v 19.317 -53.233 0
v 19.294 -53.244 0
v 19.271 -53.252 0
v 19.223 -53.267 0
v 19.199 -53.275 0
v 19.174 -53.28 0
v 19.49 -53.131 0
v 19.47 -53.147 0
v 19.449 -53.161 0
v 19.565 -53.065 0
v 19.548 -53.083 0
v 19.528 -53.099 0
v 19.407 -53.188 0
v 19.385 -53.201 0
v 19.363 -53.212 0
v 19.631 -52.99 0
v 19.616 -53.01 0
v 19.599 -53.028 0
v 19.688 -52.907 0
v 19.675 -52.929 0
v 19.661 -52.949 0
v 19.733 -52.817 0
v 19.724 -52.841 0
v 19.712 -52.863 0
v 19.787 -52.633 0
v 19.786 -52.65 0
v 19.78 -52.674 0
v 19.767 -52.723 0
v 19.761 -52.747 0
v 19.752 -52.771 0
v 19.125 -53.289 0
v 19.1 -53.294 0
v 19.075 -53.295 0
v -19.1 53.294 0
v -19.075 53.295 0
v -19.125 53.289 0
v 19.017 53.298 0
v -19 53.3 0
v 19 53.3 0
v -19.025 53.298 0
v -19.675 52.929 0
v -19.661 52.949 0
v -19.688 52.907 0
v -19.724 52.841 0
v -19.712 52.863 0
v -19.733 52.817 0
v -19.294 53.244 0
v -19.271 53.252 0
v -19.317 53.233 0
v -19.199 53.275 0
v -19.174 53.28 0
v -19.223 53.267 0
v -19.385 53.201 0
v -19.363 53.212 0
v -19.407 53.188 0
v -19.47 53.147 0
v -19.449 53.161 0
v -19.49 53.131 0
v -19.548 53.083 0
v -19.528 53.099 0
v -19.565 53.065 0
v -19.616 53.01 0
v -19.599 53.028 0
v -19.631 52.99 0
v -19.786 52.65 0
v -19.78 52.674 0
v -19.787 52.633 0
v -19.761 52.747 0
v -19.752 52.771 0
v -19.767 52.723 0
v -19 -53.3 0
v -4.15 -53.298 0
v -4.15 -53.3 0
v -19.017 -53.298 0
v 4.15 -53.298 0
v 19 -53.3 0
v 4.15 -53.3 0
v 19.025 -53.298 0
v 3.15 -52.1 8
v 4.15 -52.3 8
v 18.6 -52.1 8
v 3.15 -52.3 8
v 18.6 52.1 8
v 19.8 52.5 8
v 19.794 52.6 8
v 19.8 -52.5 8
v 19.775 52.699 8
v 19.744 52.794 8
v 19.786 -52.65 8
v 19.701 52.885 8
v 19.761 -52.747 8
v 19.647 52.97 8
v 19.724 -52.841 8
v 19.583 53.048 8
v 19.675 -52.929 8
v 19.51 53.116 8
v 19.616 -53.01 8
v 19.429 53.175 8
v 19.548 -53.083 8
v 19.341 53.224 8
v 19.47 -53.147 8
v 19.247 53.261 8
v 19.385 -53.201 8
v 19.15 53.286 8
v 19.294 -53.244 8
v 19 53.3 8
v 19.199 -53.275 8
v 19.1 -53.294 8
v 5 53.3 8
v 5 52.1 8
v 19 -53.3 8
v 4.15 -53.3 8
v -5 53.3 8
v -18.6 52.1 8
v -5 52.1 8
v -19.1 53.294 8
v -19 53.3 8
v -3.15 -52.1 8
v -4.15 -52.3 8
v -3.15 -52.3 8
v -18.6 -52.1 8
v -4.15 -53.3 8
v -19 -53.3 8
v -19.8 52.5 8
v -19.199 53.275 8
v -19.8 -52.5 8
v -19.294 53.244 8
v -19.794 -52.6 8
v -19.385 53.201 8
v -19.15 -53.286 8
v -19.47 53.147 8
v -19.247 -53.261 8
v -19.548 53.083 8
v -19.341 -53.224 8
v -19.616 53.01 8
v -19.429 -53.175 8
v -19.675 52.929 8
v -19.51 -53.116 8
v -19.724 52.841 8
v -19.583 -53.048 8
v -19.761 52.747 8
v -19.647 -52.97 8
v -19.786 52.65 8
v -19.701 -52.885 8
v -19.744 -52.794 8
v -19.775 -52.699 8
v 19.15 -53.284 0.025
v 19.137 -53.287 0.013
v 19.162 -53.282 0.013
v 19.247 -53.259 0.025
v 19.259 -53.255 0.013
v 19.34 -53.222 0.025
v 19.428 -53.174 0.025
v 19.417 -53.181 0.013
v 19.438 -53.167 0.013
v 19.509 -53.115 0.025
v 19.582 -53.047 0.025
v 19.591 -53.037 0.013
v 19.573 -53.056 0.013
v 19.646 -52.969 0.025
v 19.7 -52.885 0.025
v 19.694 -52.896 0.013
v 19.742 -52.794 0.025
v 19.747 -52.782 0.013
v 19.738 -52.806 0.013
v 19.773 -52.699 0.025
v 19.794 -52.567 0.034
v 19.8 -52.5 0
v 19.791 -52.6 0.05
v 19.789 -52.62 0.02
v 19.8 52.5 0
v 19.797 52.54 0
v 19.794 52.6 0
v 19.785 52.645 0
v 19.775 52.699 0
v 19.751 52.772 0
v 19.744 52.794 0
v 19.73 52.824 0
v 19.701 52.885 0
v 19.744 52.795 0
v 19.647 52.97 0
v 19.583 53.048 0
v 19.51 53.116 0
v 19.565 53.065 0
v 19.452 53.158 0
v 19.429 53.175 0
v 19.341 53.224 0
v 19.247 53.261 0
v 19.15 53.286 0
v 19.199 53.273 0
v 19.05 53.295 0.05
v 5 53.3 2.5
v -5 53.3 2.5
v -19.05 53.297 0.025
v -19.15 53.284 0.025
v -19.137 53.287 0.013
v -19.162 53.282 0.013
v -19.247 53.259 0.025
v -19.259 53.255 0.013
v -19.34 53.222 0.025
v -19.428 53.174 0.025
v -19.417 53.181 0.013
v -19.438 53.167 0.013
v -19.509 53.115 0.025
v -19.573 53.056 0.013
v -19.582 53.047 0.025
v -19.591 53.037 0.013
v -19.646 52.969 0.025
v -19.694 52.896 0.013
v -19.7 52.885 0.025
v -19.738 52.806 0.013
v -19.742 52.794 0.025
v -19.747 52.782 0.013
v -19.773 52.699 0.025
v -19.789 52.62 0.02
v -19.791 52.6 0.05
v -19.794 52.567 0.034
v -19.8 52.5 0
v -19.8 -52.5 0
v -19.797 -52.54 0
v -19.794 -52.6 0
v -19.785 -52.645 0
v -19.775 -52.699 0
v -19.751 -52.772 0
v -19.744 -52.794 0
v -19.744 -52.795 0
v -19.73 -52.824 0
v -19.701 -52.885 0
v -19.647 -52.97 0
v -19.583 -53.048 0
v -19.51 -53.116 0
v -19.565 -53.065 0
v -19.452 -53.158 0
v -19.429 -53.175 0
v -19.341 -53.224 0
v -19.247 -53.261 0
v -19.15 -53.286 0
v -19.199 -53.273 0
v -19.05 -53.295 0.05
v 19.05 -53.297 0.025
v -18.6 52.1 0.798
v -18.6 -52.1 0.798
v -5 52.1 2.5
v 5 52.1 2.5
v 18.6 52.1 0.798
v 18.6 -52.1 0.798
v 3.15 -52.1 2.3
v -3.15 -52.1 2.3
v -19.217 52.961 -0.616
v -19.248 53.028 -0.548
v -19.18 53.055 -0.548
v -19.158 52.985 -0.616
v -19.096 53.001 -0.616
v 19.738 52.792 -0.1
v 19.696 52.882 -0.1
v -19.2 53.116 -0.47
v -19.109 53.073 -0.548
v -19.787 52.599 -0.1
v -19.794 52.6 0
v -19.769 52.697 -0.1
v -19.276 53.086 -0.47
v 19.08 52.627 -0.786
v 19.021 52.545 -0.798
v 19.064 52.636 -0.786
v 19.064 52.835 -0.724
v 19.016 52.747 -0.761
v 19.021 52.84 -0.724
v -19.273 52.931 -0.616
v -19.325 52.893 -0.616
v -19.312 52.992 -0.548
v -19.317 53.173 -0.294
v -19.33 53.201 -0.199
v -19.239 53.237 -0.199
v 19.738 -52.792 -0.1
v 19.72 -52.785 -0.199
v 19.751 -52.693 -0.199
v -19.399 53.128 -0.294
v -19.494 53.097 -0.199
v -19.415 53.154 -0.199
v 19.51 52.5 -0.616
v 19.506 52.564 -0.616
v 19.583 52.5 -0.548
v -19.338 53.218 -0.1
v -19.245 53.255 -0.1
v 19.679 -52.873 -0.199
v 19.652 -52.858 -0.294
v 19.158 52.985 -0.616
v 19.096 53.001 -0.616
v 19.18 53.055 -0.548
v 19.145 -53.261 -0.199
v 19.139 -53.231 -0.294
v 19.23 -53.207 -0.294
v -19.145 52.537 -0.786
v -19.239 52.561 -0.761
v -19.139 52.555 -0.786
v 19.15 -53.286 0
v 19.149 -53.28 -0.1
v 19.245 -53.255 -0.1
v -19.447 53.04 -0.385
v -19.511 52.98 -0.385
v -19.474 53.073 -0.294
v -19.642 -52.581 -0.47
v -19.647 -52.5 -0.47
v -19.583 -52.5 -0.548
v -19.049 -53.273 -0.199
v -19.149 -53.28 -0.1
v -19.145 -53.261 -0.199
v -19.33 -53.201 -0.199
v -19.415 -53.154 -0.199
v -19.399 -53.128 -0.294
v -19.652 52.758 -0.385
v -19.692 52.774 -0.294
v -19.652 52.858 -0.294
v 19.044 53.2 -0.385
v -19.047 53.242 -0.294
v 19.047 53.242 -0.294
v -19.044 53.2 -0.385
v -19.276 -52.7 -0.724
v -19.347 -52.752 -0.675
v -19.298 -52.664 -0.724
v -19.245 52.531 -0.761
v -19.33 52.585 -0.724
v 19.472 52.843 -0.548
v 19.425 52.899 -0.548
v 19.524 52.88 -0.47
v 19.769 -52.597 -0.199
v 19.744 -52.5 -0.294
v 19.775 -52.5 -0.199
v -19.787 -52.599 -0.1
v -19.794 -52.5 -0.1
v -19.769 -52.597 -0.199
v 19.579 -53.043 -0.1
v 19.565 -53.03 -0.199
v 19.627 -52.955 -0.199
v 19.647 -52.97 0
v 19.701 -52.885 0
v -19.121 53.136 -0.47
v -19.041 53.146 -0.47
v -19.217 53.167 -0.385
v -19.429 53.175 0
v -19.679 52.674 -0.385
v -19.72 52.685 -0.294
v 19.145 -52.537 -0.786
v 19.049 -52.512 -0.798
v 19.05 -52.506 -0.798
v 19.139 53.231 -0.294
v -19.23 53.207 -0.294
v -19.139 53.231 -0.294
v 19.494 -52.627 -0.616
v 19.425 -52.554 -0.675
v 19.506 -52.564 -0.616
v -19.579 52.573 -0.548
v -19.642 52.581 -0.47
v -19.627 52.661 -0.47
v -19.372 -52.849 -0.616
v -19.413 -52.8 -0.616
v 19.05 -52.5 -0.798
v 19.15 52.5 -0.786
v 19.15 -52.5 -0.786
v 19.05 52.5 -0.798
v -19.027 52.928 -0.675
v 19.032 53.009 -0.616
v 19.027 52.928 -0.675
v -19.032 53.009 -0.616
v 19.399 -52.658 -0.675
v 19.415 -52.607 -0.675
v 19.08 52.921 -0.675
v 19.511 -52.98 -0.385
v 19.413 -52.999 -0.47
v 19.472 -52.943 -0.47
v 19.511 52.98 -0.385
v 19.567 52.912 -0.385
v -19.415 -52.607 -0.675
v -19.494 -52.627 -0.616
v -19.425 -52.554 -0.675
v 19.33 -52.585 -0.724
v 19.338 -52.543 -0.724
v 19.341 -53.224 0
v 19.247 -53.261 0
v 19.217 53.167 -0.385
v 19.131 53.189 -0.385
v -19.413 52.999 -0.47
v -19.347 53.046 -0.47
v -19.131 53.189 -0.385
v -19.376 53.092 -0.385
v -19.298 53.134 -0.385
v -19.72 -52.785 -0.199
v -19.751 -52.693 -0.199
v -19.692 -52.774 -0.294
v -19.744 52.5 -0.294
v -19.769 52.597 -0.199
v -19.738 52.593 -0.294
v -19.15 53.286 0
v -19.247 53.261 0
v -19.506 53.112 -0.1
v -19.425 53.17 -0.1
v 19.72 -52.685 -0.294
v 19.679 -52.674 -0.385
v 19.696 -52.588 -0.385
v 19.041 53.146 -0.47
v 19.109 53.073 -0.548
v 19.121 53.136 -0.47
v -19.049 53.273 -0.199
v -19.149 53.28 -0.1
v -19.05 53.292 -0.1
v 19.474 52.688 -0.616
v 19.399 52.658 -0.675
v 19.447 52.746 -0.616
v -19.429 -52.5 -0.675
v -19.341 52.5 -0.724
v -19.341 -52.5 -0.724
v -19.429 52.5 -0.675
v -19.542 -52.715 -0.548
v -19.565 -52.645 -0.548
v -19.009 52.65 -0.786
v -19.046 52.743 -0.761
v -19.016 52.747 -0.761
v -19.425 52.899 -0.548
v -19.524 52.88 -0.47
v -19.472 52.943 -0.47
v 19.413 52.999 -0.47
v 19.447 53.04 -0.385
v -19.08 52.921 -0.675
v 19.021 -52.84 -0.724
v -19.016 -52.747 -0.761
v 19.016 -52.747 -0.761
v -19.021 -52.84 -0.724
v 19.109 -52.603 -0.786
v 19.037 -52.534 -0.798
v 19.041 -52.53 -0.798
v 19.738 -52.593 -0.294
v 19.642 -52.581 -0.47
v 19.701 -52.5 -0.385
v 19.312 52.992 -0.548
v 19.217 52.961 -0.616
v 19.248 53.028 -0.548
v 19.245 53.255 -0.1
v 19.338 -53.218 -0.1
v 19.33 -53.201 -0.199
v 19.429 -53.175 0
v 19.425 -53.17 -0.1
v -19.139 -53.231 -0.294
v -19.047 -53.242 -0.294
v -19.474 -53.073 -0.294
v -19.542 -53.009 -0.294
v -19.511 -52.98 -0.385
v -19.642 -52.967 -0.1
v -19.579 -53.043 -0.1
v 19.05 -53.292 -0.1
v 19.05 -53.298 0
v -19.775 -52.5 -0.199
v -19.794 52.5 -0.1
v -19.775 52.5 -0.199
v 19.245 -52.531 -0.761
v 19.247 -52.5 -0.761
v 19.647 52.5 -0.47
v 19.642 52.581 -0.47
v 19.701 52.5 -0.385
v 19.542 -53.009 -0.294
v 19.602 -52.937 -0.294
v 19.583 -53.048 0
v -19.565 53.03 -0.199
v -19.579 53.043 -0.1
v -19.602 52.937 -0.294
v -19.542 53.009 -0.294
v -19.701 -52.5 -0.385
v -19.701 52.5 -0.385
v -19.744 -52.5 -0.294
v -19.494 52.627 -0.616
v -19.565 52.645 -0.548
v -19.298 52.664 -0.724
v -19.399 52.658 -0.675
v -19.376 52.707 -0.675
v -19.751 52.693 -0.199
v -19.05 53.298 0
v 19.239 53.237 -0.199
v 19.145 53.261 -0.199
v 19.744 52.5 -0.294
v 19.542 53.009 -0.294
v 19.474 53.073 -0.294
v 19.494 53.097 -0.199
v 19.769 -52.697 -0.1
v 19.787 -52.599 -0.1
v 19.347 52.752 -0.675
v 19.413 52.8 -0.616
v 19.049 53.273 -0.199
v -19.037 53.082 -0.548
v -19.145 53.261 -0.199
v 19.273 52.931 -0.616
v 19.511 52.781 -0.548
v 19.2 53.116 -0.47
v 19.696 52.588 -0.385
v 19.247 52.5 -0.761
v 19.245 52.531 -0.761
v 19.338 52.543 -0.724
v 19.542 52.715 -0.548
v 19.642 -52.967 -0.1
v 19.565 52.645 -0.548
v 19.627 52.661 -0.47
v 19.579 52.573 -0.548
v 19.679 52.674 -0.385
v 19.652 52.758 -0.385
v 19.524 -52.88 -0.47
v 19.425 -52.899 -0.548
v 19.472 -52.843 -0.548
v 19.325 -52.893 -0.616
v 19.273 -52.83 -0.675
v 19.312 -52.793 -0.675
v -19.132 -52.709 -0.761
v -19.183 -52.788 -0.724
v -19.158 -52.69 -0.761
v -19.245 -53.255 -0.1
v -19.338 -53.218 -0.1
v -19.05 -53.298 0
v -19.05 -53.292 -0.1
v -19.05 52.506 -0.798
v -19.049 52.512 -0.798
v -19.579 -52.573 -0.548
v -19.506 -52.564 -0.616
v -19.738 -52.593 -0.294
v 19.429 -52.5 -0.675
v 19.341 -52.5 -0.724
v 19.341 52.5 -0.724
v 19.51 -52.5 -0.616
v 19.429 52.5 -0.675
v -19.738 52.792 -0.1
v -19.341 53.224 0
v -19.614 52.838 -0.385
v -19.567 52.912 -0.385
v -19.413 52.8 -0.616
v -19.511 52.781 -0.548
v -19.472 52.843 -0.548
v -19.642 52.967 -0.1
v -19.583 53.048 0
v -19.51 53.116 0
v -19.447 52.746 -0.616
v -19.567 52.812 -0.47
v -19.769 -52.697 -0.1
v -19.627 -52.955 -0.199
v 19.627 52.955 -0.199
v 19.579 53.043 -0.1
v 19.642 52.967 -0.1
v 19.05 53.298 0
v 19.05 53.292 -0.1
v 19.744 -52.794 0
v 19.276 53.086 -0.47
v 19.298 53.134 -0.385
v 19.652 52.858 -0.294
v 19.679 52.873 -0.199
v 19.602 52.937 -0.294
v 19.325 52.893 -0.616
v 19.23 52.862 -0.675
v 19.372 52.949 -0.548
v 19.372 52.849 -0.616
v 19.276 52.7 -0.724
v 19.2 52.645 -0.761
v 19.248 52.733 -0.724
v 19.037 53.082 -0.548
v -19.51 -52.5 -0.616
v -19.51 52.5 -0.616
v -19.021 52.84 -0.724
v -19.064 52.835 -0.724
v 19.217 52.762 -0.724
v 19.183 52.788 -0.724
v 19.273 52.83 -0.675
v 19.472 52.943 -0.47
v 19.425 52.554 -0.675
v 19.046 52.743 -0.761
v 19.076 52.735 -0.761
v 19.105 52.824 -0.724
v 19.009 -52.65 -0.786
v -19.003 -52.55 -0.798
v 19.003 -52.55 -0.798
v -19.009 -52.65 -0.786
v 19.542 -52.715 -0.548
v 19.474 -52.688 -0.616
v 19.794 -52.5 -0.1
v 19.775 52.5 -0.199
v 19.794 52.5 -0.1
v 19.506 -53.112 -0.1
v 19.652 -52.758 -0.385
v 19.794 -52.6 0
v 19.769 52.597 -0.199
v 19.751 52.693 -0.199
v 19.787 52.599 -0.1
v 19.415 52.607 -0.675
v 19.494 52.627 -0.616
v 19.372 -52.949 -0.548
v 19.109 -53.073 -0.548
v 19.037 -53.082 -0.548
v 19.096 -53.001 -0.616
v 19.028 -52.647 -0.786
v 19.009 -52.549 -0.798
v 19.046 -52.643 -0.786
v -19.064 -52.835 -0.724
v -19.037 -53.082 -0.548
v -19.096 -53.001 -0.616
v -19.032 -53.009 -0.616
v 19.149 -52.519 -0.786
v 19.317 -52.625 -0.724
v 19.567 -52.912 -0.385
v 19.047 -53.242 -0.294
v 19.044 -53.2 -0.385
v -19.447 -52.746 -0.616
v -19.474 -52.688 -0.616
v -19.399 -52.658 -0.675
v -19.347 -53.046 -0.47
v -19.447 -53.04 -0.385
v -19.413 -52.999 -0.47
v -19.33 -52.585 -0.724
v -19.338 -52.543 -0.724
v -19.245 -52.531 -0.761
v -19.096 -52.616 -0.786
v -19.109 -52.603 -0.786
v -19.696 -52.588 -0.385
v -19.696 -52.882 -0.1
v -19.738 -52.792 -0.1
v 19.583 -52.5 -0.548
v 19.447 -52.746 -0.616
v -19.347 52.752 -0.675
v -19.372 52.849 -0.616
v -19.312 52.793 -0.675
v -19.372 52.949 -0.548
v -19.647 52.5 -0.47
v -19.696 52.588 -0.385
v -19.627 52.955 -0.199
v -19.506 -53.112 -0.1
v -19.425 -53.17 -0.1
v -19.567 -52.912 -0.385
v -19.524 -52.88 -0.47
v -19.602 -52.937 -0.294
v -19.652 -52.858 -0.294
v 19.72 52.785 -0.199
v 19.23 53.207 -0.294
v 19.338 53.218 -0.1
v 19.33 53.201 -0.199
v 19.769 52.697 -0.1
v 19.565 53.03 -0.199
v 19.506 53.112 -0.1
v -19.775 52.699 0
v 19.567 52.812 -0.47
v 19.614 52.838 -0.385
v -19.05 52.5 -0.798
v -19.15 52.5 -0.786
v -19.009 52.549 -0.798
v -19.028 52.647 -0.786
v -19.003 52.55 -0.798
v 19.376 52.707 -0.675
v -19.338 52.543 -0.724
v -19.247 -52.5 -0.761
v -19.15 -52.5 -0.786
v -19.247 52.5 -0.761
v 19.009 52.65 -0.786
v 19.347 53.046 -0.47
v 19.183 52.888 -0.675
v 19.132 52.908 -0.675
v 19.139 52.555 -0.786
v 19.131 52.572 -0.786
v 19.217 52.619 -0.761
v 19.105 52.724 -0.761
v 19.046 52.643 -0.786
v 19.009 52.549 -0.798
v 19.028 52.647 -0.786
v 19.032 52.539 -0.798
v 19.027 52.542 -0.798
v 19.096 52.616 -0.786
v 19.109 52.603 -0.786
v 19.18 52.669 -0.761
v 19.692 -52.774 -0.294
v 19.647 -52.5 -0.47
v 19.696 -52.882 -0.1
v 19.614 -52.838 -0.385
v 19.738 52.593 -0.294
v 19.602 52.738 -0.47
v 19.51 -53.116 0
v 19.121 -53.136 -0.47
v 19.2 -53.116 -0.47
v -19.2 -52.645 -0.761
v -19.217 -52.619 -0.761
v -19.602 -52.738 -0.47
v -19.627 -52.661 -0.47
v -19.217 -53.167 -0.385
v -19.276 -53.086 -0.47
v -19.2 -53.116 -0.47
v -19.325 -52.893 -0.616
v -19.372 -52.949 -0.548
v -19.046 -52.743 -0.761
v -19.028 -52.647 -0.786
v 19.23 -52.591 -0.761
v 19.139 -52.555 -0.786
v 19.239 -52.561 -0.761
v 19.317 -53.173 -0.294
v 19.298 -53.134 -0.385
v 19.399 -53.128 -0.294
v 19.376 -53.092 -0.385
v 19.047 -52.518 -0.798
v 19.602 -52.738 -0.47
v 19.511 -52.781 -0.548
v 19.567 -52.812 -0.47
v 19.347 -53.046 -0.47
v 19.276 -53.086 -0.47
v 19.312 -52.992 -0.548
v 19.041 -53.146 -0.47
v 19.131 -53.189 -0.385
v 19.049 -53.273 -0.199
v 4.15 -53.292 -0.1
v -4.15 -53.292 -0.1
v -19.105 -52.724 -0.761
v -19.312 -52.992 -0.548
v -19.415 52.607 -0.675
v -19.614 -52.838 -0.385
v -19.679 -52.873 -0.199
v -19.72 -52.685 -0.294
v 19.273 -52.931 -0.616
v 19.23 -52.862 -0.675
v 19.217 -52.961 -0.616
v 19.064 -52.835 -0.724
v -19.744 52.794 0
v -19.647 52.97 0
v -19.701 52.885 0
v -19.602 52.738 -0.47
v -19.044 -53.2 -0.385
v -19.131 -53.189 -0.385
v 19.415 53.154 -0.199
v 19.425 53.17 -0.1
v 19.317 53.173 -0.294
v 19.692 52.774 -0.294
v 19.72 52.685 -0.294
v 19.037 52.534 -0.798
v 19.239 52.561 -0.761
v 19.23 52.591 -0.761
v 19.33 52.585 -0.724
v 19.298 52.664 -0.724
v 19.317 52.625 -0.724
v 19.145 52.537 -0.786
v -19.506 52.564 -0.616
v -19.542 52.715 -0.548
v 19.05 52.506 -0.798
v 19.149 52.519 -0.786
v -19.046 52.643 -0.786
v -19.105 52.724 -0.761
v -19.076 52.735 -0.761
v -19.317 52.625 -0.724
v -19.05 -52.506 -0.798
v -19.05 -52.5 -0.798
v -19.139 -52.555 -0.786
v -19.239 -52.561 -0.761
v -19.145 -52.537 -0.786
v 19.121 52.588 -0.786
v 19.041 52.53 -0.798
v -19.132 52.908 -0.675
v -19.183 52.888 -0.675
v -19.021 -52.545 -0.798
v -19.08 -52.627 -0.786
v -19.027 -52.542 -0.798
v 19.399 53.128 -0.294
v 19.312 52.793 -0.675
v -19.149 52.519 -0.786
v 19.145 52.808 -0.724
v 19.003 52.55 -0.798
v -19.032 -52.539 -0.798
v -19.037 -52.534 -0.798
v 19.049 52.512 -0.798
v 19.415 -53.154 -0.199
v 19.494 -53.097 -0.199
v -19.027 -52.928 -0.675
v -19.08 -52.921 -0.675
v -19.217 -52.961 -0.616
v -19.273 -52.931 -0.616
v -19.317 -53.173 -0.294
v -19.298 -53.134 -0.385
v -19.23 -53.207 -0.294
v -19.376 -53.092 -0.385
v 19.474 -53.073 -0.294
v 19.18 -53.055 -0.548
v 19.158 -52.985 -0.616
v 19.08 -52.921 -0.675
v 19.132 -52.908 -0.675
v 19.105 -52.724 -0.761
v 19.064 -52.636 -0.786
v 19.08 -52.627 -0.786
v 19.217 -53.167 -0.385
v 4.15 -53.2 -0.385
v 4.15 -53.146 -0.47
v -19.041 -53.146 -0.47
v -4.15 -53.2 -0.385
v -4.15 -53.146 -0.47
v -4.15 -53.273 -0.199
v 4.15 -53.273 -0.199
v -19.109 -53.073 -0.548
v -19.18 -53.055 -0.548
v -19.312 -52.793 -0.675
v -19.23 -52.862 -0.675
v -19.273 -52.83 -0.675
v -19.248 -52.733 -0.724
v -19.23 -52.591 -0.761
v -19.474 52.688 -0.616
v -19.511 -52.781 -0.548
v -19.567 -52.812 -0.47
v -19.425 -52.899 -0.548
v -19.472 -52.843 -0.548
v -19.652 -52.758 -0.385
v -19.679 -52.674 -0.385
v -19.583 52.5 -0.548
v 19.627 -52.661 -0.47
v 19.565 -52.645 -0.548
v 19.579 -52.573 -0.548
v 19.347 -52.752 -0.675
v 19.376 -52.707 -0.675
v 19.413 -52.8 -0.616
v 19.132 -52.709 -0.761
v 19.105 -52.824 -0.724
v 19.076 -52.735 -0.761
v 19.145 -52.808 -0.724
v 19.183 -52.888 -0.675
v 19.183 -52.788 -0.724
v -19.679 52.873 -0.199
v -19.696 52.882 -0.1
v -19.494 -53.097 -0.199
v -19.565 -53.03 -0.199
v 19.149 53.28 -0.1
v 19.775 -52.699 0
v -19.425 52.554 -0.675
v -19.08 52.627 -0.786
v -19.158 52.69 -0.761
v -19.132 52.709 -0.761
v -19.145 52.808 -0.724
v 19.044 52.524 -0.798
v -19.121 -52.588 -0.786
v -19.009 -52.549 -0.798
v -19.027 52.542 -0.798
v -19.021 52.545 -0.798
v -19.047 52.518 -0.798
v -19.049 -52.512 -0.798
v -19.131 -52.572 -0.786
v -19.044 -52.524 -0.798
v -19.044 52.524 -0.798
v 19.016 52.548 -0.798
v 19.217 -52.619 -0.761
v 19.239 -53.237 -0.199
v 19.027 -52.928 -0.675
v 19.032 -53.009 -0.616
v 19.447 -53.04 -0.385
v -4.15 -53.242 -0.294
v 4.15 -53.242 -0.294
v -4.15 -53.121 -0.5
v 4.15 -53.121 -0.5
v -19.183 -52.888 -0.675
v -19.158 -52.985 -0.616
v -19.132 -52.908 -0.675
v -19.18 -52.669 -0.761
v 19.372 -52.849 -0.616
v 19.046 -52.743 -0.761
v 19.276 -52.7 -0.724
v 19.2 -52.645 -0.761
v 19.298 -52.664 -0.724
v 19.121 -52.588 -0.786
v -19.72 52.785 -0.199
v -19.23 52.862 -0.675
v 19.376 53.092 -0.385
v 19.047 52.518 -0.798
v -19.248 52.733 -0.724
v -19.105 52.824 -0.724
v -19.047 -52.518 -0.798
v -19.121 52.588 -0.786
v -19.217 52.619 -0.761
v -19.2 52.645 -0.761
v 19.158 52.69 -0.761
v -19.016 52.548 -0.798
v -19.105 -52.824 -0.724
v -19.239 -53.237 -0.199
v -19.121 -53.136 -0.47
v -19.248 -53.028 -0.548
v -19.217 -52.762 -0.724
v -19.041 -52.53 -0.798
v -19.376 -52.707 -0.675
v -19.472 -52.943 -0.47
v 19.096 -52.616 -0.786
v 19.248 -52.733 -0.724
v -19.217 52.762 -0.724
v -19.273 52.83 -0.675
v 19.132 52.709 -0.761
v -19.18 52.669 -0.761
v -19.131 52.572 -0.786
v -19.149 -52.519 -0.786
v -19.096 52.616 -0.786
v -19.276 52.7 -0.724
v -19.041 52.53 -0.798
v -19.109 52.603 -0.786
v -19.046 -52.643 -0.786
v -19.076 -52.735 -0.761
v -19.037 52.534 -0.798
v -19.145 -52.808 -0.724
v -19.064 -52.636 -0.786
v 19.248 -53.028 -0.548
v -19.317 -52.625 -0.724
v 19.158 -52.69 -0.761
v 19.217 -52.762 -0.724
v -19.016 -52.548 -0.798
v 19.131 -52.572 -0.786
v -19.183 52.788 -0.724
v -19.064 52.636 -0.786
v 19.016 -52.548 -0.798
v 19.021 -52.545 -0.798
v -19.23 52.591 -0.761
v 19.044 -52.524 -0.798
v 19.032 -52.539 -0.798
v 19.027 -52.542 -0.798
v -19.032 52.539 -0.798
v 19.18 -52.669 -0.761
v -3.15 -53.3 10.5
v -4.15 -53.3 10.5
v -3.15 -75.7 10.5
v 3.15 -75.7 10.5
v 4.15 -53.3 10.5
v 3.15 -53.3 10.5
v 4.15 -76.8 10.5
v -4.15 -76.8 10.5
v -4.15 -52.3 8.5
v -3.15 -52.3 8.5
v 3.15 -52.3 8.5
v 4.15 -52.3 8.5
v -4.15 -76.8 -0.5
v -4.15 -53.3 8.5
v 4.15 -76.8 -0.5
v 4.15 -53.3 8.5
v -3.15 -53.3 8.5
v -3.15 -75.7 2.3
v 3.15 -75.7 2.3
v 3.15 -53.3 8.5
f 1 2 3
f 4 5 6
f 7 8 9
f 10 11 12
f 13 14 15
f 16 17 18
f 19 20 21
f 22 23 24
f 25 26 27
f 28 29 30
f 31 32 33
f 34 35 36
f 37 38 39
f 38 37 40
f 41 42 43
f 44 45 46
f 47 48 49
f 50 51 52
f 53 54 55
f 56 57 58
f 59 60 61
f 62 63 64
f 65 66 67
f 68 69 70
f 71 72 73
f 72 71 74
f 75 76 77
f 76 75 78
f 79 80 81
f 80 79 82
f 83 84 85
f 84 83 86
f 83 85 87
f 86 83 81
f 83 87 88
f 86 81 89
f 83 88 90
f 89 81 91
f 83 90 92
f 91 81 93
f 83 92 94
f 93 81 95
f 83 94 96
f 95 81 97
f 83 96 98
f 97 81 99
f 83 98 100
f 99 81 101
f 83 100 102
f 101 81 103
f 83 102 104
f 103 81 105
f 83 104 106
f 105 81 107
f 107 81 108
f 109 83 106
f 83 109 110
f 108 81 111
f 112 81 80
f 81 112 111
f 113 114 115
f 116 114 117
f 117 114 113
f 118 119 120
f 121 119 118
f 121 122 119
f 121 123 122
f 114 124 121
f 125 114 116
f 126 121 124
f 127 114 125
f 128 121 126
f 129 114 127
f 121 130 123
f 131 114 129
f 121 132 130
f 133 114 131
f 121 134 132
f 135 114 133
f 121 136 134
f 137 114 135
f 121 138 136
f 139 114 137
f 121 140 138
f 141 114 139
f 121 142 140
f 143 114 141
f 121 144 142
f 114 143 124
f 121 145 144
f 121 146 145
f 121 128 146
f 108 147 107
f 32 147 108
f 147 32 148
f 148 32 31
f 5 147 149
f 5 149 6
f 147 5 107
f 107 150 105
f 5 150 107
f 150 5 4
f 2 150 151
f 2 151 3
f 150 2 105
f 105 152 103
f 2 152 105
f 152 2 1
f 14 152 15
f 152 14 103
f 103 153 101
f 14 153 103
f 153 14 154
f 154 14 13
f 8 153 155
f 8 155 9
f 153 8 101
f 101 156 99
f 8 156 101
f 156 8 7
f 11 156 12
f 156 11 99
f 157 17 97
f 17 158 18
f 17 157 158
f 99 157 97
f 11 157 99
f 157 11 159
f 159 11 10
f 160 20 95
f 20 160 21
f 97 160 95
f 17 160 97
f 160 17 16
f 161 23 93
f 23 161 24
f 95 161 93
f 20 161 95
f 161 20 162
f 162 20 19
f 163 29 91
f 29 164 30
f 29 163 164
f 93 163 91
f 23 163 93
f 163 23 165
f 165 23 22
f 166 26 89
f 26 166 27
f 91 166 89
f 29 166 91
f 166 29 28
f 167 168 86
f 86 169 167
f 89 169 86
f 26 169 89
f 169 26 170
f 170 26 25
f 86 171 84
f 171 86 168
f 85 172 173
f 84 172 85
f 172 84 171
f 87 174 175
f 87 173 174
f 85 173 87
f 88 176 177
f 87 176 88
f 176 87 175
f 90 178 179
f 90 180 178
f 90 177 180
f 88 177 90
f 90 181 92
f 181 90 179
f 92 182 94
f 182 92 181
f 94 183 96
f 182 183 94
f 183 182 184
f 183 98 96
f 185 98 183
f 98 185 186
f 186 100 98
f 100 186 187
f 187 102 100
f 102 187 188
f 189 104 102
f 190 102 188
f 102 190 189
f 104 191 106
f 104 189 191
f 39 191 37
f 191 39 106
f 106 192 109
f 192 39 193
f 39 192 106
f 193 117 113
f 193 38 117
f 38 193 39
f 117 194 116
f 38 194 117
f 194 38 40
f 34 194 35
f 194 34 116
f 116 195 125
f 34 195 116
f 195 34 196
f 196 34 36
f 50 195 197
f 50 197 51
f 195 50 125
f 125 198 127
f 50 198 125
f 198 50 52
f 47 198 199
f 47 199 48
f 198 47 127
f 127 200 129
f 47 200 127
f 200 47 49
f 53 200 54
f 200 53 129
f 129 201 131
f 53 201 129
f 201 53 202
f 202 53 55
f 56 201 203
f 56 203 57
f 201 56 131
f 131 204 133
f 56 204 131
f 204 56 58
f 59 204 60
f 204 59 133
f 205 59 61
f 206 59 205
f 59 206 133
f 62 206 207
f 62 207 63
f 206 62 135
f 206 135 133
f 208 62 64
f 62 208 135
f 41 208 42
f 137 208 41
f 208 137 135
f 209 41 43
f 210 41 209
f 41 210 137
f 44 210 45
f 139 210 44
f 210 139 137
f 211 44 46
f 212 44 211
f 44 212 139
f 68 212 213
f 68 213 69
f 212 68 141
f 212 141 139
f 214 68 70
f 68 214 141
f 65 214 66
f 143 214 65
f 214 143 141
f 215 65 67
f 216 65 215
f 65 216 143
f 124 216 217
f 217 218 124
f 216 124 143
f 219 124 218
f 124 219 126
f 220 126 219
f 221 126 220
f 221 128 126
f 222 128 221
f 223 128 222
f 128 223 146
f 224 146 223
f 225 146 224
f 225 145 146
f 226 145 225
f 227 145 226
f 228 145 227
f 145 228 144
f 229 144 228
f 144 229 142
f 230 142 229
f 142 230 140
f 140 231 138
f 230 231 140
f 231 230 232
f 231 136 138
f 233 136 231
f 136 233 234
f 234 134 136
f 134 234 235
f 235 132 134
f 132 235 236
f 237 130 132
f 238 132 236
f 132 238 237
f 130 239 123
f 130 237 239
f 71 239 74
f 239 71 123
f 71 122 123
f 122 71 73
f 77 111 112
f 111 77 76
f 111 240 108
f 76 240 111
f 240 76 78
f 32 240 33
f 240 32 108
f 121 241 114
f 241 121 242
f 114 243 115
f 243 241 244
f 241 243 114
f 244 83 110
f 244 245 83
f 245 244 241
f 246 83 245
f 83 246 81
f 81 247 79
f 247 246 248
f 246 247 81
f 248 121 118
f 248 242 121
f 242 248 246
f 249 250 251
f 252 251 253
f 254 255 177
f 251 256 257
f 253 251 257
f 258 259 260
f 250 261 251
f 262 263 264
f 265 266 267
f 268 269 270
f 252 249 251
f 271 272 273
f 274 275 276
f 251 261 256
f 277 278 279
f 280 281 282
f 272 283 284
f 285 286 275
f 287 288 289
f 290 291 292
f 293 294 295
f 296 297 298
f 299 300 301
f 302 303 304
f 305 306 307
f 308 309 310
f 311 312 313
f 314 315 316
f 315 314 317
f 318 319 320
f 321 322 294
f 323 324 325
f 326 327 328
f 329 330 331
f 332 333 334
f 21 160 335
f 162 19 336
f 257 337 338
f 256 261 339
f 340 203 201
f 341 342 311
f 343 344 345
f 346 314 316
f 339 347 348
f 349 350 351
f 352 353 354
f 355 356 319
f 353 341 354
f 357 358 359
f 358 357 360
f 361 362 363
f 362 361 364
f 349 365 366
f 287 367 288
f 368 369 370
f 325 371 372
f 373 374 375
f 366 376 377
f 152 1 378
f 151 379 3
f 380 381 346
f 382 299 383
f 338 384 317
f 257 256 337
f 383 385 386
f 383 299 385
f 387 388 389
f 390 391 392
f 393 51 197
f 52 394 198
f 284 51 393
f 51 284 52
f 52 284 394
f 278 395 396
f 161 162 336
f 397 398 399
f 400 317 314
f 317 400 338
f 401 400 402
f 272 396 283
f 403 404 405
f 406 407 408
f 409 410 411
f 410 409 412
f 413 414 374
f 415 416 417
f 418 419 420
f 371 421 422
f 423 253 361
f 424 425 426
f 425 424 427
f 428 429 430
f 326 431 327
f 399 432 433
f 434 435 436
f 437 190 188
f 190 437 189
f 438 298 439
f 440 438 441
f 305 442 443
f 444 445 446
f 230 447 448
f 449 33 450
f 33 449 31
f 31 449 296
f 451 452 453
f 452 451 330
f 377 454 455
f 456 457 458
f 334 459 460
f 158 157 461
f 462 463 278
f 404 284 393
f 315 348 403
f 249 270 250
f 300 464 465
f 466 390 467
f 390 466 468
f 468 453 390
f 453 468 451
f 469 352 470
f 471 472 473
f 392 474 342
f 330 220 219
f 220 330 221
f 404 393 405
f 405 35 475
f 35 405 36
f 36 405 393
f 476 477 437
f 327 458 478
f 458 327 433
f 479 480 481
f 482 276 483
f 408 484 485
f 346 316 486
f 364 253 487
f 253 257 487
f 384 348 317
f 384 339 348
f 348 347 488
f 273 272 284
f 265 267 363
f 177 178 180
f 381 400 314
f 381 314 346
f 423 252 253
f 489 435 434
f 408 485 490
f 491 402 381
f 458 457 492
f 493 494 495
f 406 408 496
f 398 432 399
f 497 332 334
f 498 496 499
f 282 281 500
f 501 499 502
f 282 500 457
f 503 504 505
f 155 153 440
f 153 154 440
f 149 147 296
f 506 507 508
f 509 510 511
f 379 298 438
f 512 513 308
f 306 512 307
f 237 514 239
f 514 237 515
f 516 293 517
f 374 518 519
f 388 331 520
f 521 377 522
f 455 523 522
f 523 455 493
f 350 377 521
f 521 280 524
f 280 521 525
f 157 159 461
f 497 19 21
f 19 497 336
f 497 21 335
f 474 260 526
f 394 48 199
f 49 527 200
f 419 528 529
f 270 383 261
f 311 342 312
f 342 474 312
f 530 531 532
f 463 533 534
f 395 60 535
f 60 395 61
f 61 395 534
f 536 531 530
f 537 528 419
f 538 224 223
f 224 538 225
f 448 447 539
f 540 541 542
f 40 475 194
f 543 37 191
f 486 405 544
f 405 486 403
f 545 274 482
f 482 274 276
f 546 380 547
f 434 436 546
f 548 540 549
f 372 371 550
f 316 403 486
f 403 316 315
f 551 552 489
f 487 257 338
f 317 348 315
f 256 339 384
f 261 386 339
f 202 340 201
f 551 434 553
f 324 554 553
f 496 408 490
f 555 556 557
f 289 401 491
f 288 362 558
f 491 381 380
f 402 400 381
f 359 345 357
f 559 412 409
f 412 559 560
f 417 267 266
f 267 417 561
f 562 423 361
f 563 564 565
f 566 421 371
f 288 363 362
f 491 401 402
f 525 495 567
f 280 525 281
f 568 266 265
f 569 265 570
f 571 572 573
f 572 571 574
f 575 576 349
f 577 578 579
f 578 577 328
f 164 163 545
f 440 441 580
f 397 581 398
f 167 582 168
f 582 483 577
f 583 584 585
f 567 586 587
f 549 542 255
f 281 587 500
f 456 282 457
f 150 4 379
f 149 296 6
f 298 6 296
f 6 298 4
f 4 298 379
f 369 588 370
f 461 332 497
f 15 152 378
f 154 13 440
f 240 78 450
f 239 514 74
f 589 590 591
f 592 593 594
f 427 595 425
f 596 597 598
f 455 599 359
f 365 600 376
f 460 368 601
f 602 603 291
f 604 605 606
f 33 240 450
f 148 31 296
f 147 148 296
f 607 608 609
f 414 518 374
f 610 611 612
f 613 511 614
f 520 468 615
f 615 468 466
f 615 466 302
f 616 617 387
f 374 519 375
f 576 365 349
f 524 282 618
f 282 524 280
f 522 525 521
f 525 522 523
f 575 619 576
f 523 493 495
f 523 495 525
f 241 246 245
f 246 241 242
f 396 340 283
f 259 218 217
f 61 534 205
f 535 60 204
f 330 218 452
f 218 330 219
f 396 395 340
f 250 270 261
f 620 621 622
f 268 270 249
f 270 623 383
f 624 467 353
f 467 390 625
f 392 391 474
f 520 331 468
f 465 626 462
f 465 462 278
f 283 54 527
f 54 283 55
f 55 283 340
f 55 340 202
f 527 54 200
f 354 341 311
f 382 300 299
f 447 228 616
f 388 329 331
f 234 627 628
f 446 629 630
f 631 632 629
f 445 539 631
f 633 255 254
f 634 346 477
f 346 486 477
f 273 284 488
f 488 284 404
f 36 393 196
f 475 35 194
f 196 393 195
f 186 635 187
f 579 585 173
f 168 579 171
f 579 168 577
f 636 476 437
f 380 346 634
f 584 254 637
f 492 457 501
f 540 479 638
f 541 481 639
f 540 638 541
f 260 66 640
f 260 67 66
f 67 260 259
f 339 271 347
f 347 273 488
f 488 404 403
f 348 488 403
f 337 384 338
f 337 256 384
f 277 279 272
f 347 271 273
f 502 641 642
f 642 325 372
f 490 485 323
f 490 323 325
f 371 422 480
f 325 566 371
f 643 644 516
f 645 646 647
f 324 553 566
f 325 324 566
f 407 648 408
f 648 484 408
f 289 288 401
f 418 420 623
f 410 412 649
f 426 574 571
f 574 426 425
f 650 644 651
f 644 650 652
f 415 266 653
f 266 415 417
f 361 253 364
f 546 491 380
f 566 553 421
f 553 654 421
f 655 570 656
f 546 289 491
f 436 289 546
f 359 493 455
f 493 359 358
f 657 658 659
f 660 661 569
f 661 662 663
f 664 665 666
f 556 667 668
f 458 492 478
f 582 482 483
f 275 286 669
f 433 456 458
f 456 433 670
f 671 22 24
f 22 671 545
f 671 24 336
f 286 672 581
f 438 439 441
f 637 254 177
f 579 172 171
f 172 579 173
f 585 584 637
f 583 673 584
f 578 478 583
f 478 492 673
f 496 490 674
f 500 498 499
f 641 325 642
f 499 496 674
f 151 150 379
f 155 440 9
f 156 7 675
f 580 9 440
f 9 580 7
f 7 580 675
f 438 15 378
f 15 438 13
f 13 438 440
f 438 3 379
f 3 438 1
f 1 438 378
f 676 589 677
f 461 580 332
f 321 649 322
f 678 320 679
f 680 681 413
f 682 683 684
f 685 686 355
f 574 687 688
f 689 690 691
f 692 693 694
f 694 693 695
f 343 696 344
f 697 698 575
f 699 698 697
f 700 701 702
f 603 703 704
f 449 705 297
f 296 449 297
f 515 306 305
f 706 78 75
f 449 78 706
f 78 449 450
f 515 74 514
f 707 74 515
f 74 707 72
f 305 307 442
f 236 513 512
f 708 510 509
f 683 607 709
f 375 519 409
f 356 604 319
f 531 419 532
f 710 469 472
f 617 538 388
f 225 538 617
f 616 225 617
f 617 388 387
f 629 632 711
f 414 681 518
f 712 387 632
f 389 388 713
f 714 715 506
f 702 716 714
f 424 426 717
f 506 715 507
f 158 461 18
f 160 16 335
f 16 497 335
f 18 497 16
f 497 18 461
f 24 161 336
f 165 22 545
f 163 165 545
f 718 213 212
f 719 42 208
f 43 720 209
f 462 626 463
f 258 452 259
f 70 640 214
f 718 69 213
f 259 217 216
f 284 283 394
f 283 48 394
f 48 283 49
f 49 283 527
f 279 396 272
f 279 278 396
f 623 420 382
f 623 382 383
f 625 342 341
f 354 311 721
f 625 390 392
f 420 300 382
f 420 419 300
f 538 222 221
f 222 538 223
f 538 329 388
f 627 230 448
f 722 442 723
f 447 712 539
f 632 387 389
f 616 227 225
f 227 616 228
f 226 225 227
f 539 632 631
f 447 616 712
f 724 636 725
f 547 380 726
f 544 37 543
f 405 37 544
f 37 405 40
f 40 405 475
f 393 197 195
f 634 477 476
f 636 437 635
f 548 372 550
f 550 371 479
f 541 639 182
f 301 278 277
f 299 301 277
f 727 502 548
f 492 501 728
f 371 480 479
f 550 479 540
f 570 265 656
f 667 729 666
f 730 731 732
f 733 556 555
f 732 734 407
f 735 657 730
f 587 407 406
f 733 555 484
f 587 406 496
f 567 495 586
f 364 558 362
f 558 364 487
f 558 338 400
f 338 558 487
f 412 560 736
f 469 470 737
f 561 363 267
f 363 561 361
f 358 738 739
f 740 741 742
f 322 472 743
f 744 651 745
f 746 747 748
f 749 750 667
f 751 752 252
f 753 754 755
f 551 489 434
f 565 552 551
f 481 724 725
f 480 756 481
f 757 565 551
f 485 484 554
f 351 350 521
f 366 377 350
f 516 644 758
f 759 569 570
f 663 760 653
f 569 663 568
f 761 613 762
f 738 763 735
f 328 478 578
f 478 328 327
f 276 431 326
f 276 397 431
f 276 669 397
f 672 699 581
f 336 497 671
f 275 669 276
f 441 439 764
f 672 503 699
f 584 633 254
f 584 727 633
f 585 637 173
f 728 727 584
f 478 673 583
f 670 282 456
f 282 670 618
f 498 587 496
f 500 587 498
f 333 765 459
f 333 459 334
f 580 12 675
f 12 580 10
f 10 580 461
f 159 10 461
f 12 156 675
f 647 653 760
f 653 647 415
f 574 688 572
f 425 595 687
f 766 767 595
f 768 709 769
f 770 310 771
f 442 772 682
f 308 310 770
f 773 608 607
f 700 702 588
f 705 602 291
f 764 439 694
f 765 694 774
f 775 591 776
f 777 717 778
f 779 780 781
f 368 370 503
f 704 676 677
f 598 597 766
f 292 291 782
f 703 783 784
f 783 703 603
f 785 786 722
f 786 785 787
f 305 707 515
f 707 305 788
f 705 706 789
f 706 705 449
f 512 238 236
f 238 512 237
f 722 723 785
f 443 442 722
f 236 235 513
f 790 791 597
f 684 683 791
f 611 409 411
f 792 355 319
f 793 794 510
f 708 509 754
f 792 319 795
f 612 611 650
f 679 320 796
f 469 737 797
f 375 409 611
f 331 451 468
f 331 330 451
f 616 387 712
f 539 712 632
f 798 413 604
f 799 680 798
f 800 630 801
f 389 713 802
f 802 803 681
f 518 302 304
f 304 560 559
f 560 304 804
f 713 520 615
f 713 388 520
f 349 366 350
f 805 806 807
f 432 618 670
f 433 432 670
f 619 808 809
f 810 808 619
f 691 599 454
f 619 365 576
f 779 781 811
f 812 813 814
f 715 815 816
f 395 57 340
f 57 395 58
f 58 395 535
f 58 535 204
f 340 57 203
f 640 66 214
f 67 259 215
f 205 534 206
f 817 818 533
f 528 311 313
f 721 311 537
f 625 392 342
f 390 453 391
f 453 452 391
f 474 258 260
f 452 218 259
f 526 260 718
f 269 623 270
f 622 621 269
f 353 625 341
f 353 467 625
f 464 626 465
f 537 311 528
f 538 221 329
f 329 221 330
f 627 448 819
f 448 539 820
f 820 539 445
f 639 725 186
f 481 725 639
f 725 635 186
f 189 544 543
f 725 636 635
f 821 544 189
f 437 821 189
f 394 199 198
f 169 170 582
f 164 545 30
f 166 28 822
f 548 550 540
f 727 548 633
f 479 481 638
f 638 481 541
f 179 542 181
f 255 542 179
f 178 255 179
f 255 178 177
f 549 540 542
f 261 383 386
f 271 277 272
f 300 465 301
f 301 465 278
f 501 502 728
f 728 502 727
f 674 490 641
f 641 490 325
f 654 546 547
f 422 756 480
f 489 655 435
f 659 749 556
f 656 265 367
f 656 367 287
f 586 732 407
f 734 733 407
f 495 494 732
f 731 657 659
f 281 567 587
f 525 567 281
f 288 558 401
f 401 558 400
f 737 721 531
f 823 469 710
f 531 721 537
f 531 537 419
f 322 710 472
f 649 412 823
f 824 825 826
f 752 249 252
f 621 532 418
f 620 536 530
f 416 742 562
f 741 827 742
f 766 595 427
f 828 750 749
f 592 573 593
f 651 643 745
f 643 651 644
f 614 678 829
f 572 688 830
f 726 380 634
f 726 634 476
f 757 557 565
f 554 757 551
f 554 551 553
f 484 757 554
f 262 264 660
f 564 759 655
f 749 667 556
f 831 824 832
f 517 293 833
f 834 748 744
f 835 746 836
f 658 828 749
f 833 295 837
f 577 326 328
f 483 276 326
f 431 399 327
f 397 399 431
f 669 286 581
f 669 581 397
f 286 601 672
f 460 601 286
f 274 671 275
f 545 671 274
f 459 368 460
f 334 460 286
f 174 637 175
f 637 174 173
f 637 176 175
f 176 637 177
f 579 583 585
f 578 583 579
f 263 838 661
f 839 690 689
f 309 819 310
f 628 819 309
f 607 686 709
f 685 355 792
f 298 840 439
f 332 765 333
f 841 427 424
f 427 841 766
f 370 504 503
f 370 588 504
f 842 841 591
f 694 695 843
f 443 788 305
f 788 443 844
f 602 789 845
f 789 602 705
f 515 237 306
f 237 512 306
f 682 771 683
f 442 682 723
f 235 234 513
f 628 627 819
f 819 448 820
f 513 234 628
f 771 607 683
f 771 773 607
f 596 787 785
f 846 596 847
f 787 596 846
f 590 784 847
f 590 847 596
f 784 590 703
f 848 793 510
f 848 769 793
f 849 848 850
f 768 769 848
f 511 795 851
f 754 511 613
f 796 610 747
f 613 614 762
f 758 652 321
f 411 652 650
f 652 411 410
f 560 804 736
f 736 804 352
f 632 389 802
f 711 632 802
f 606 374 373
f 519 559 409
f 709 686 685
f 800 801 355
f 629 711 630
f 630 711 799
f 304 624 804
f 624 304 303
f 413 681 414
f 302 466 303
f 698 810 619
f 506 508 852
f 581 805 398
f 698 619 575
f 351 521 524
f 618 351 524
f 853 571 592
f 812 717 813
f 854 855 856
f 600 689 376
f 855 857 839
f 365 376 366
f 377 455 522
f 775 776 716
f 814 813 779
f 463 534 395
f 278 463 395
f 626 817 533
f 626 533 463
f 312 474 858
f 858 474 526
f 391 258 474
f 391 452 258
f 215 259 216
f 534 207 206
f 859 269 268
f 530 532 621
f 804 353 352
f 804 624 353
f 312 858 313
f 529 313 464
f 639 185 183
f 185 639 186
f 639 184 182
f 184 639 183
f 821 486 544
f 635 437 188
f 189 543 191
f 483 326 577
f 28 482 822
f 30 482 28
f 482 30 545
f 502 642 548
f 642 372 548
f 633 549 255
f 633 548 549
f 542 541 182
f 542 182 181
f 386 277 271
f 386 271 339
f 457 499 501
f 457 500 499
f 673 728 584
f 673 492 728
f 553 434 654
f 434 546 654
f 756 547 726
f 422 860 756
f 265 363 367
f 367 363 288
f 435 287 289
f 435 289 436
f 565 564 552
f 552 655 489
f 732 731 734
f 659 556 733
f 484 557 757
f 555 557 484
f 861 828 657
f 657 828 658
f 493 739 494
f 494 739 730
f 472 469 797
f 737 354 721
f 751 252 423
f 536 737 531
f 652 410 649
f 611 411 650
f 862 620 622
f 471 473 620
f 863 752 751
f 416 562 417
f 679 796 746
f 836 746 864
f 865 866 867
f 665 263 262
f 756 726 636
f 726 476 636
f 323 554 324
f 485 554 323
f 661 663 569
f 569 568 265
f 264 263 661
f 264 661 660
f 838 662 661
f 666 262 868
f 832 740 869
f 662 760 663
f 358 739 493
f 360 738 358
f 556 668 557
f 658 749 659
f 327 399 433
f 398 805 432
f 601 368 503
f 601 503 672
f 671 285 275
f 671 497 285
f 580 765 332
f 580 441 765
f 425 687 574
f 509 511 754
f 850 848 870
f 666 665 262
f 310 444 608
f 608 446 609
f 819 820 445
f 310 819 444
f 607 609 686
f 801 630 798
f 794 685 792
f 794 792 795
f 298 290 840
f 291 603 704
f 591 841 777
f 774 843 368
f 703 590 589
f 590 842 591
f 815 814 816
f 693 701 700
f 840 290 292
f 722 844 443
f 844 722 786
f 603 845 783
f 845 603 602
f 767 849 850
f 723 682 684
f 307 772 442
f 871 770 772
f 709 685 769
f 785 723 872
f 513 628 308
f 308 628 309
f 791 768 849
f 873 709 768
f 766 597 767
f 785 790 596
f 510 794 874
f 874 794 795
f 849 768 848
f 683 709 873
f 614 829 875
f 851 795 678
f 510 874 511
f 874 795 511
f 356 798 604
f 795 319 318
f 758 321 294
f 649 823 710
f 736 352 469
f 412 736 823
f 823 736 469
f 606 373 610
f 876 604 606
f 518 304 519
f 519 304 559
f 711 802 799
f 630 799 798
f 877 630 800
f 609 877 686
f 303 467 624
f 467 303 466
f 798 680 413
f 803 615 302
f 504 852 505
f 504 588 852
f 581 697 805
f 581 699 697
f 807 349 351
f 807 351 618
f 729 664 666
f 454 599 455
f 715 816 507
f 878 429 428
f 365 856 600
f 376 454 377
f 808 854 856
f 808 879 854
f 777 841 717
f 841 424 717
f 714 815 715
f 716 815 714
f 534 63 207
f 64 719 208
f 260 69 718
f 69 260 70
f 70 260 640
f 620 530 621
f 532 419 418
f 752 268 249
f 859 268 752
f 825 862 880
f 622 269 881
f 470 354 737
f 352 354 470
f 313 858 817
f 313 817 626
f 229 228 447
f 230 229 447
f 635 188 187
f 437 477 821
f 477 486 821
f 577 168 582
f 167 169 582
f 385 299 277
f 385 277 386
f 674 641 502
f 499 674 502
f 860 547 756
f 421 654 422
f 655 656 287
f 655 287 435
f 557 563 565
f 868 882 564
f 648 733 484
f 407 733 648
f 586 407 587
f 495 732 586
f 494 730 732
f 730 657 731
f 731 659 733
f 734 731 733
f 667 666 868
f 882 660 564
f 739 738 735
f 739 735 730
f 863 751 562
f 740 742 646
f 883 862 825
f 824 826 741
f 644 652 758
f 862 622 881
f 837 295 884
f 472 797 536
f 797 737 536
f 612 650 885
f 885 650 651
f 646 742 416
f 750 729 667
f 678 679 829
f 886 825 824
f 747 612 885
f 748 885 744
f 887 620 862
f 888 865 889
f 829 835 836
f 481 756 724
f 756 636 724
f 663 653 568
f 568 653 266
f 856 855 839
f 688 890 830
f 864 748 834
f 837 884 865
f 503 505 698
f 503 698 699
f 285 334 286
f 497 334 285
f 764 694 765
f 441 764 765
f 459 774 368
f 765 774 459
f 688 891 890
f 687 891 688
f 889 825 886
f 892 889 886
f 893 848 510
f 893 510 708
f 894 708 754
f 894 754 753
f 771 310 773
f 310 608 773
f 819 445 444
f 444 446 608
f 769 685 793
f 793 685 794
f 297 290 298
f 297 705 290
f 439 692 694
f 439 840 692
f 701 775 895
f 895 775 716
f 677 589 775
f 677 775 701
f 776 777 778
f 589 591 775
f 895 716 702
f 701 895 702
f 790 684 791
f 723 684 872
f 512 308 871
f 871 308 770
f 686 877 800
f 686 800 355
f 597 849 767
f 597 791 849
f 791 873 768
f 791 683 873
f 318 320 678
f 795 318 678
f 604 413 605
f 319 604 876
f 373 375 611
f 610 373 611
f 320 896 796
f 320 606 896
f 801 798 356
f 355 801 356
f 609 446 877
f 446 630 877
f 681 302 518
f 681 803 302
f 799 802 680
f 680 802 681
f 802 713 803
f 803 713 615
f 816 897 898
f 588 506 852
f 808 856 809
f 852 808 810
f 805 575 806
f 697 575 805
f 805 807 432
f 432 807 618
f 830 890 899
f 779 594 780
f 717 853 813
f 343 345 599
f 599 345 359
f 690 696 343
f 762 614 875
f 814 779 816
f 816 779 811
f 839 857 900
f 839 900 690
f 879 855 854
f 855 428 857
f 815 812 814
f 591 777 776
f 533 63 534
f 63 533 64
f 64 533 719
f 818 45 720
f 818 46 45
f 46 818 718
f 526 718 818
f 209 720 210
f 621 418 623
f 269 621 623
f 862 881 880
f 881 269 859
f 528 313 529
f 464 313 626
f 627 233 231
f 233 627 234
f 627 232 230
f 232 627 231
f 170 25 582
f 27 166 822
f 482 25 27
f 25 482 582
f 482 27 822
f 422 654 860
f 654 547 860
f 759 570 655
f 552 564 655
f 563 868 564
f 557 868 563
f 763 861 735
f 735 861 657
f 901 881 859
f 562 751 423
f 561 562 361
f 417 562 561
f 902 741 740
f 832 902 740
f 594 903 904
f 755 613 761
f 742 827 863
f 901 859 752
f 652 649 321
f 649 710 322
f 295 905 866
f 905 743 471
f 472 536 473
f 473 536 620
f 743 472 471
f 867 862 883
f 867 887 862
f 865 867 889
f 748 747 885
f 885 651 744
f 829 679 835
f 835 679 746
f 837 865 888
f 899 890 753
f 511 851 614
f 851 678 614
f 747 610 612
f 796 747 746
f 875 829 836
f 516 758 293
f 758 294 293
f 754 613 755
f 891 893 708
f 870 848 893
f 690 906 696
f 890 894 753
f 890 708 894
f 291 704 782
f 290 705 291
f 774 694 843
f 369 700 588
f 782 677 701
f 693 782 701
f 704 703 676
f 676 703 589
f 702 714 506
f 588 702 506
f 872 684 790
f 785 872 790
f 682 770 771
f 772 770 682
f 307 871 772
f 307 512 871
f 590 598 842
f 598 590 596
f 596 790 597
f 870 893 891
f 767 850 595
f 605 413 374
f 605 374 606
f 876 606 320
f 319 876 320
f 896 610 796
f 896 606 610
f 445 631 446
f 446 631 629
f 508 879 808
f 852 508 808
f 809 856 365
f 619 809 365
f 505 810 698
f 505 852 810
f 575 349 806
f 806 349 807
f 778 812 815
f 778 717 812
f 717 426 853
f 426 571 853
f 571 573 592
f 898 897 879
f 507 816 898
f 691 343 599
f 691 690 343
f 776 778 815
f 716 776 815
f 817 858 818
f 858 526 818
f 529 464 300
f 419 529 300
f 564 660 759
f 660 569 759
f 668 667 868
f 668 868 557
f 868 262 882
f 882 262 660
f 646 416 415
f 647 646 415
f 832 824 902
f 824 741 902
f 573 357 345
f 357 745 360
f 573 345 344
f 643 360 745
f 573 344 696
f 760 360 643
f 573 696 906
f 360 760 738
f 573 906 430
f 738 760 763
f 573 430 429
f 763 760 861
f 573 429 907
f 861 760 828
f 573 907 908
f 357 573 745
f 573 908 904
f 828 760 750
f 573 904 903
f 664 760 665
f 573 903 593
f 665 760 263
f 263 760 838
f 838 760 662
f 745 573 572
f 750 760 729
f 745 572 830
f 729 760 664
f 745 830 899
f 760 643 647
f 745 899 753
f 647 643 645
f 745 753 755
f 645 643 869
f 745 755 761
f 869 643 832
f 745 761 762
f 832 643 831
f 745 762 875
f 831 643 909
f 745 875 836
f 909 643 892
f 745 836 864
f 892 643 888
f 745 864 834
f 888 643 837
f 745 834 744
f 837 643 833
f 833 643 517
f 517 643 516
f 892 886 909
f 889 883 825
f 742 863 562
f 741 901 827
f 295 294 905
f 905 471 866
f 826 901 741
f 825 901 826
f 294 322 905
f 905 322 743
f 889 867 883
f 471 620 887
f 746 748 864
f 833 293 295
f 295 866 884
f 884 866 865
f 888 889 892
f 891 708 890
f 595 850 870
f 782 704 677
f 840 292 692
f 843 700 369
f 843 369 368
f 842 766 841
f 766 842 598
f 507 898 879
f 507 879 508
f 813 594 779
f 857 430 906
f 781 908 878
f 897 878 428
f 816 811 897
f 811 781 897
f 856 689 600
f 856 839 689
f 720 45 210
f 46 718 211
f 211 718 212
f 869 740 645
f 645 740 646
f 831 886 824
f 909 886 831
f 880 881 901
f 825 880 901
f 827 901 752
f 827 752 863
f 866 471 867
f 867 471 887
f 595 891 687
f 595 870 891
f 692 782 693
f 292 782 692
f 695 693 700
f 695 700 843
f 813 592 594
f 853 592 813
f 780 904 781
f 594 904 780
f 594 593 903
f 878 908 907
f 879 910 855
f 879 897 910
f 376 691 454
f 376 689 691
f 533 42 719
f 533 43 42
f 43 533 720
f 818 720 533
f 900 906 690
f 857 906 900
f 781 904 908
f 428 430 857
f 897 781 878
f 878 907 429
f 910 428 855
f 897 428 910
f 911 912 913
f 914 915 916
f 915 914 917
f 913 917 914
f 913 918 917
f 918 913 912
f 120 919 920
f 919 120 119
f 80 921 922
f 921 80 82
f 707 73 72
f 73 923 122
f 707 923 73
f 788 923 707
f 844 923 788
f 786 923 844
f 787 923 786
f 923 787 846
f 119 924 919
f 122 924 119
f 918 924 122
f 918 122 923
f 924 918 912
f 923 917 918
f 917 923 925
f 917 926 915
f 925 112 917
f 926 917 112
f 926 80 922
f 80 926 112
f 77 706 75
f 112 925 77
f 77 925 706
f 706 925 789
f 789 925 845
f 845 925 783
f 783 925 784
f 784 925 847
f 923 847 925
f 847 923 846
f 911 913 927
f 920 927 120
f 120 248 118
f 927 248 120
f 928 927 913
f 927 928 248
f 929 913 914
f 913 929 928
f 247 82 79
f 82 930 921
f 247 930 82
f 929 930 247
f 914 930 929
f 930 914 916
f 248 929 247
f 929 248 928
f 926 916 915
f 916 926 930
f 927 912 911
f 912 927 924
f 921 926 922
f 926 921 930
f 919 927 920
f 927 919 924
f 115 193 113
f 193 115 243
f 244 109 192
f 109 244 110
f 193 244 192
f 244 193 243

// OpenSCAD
$fn=50;

BOX_W = 38; // Box Width
BOX_L = 105;// Box Length
BOX_H = 8.0; // Box Height

CORNER_RADIUS = 0.8; // Radius of corners
WALL = 0.8;// Wall Thickness all sides

MIC_OUTSIDE_WIDTH=8.3;
MIC_OUTSIDE_HEIGHT=11.0;
MIC_INSIDE_WIDTH=6.3;
MIC_LENGTH=24.5;

CON_OUTSIDE=5;
CON_INSIDE=4;
CON_LENGTH=3;

MIC_OFFSET_X = 0;
MIC_OFFSET_Y = -34.3;
MIC_OFFSET_Z = 0;

VENT_OFFSET = -4.5;
VENT_L = 19.0;
VENT_R = -19.0;

module sq_vent(x, y, vent_offset) {
    translate([x, y, BOX_H + vent_offset]) {
        rotate([90, 0, 90]) {
            linear_extrude(2.5) square([2, 2], center=true);
        }
    }
}

module vent(x, y, vent_offset) {
    translate([x, y, BOX_H + vent_offset]) {
        rotate([90, 0, 90]) {
            cylinder(h=3.0, d=2.0, center=true);
        }
    }
}

difference() {
    union() {
        linear_extrude( BOX_H )
        difference(){
            offset(r=CORNER_RADIUS) square( [BOX_W, BOX_L], center=true );
            offset(r= CORNER_RADIUS - WALL) square([BOX_W-WALL, BOX_L-WALL], center=true );
        };
        coordinates = [ [0,0],[0,BOX_L],[BOX_W,BOX_L],[BOX_W,0] ];
        translate ( [-BOX_W/2, -BOX_L/2] )
            hull()
            for (i = coordinates)
            translate(i) sphere(CORNER_RADIUS);
            
        translate([MIC_OFFSET_X, MIC_OFFSET_Y, MIC_OFFSET_Z]){
            // mic box
            translate([0,-18.0,BOX_H-3])
            rotate([90,0,0])
            linear_extrude(MIC_LENGTH)square([MIC_OUTSIDE_WIDTH,MIC_OUTSIDE_HEIGHT], center=true);
        }
    }
    translate([MIC_OFFSET_X, MIC_OFFSET_Y, MIC_OFFSET_Z]){
        // inside mic channel
        translate([0,-13.8,BOX_H-0.2]) // inside
        rotate([90,0,0])
        linear_extrude(MIC_LENGTH+3.1) square([MIC_INSIDE_WIDTH,MIC_OUTSIDE_HEIGHT], center=true); 
        
        // mic lid clearance at mic box opening
        translate([0,-17,BOX_H+1.60])
        rotate([90,0,0])
        linear_extrude(2.0) square([9,2.2], center=true);   
    }
    // cable exit
    translate([0,54.0,BOX_H-2.5])
    rotate([90,0,0])
    #linear_extrude(3.0) square([10,6], center=true);
    
    /*
    // gas sensor vents
    vent(VENT_L, 29.0, VENT_OFFSET);
    vent(VENT_L, 21.0, VENT_OFFSET);
    vent(VENT_L, 13.0, VENT_OFFSET);
    vent(VENT_L, 5.0, VENT_OFFSET);
    vent(VENT_L, -3.0, VENT_OFFSET);
    vent(VENT_L, -11.0, VENT_OFFSET);
    
    vent(VENT_R, 29.0, VENT_OFFSET);
    vent(VENT_R, 21.0, VENT_OFFSET);
    vent(VENT_R, 13.0, VENT_OFFSET);
    vent(VENT_R, 5.0, VENT_OFFSET);
    vent(VENT_R, -3.0, VENT_OFFSET);
    vent(VENT_R, -11.0, VENT_OFFSET);
    */
}

/*
// save for archiving

module waterdrop() {
    difference(){
        // Main drop shape
        # cylinder(r1=0, r2=0.1875, h=0.375, center=false);
        
        // To subtract from the base to make it rounded like a waterdrop
        translate([0, 0, -0.05])
        sphere(r=0.1875);
    }
}

for(i=[0:2]){
    translate([i*0.5, 0, 0]){
        waterdrop();
    }
}
*/
